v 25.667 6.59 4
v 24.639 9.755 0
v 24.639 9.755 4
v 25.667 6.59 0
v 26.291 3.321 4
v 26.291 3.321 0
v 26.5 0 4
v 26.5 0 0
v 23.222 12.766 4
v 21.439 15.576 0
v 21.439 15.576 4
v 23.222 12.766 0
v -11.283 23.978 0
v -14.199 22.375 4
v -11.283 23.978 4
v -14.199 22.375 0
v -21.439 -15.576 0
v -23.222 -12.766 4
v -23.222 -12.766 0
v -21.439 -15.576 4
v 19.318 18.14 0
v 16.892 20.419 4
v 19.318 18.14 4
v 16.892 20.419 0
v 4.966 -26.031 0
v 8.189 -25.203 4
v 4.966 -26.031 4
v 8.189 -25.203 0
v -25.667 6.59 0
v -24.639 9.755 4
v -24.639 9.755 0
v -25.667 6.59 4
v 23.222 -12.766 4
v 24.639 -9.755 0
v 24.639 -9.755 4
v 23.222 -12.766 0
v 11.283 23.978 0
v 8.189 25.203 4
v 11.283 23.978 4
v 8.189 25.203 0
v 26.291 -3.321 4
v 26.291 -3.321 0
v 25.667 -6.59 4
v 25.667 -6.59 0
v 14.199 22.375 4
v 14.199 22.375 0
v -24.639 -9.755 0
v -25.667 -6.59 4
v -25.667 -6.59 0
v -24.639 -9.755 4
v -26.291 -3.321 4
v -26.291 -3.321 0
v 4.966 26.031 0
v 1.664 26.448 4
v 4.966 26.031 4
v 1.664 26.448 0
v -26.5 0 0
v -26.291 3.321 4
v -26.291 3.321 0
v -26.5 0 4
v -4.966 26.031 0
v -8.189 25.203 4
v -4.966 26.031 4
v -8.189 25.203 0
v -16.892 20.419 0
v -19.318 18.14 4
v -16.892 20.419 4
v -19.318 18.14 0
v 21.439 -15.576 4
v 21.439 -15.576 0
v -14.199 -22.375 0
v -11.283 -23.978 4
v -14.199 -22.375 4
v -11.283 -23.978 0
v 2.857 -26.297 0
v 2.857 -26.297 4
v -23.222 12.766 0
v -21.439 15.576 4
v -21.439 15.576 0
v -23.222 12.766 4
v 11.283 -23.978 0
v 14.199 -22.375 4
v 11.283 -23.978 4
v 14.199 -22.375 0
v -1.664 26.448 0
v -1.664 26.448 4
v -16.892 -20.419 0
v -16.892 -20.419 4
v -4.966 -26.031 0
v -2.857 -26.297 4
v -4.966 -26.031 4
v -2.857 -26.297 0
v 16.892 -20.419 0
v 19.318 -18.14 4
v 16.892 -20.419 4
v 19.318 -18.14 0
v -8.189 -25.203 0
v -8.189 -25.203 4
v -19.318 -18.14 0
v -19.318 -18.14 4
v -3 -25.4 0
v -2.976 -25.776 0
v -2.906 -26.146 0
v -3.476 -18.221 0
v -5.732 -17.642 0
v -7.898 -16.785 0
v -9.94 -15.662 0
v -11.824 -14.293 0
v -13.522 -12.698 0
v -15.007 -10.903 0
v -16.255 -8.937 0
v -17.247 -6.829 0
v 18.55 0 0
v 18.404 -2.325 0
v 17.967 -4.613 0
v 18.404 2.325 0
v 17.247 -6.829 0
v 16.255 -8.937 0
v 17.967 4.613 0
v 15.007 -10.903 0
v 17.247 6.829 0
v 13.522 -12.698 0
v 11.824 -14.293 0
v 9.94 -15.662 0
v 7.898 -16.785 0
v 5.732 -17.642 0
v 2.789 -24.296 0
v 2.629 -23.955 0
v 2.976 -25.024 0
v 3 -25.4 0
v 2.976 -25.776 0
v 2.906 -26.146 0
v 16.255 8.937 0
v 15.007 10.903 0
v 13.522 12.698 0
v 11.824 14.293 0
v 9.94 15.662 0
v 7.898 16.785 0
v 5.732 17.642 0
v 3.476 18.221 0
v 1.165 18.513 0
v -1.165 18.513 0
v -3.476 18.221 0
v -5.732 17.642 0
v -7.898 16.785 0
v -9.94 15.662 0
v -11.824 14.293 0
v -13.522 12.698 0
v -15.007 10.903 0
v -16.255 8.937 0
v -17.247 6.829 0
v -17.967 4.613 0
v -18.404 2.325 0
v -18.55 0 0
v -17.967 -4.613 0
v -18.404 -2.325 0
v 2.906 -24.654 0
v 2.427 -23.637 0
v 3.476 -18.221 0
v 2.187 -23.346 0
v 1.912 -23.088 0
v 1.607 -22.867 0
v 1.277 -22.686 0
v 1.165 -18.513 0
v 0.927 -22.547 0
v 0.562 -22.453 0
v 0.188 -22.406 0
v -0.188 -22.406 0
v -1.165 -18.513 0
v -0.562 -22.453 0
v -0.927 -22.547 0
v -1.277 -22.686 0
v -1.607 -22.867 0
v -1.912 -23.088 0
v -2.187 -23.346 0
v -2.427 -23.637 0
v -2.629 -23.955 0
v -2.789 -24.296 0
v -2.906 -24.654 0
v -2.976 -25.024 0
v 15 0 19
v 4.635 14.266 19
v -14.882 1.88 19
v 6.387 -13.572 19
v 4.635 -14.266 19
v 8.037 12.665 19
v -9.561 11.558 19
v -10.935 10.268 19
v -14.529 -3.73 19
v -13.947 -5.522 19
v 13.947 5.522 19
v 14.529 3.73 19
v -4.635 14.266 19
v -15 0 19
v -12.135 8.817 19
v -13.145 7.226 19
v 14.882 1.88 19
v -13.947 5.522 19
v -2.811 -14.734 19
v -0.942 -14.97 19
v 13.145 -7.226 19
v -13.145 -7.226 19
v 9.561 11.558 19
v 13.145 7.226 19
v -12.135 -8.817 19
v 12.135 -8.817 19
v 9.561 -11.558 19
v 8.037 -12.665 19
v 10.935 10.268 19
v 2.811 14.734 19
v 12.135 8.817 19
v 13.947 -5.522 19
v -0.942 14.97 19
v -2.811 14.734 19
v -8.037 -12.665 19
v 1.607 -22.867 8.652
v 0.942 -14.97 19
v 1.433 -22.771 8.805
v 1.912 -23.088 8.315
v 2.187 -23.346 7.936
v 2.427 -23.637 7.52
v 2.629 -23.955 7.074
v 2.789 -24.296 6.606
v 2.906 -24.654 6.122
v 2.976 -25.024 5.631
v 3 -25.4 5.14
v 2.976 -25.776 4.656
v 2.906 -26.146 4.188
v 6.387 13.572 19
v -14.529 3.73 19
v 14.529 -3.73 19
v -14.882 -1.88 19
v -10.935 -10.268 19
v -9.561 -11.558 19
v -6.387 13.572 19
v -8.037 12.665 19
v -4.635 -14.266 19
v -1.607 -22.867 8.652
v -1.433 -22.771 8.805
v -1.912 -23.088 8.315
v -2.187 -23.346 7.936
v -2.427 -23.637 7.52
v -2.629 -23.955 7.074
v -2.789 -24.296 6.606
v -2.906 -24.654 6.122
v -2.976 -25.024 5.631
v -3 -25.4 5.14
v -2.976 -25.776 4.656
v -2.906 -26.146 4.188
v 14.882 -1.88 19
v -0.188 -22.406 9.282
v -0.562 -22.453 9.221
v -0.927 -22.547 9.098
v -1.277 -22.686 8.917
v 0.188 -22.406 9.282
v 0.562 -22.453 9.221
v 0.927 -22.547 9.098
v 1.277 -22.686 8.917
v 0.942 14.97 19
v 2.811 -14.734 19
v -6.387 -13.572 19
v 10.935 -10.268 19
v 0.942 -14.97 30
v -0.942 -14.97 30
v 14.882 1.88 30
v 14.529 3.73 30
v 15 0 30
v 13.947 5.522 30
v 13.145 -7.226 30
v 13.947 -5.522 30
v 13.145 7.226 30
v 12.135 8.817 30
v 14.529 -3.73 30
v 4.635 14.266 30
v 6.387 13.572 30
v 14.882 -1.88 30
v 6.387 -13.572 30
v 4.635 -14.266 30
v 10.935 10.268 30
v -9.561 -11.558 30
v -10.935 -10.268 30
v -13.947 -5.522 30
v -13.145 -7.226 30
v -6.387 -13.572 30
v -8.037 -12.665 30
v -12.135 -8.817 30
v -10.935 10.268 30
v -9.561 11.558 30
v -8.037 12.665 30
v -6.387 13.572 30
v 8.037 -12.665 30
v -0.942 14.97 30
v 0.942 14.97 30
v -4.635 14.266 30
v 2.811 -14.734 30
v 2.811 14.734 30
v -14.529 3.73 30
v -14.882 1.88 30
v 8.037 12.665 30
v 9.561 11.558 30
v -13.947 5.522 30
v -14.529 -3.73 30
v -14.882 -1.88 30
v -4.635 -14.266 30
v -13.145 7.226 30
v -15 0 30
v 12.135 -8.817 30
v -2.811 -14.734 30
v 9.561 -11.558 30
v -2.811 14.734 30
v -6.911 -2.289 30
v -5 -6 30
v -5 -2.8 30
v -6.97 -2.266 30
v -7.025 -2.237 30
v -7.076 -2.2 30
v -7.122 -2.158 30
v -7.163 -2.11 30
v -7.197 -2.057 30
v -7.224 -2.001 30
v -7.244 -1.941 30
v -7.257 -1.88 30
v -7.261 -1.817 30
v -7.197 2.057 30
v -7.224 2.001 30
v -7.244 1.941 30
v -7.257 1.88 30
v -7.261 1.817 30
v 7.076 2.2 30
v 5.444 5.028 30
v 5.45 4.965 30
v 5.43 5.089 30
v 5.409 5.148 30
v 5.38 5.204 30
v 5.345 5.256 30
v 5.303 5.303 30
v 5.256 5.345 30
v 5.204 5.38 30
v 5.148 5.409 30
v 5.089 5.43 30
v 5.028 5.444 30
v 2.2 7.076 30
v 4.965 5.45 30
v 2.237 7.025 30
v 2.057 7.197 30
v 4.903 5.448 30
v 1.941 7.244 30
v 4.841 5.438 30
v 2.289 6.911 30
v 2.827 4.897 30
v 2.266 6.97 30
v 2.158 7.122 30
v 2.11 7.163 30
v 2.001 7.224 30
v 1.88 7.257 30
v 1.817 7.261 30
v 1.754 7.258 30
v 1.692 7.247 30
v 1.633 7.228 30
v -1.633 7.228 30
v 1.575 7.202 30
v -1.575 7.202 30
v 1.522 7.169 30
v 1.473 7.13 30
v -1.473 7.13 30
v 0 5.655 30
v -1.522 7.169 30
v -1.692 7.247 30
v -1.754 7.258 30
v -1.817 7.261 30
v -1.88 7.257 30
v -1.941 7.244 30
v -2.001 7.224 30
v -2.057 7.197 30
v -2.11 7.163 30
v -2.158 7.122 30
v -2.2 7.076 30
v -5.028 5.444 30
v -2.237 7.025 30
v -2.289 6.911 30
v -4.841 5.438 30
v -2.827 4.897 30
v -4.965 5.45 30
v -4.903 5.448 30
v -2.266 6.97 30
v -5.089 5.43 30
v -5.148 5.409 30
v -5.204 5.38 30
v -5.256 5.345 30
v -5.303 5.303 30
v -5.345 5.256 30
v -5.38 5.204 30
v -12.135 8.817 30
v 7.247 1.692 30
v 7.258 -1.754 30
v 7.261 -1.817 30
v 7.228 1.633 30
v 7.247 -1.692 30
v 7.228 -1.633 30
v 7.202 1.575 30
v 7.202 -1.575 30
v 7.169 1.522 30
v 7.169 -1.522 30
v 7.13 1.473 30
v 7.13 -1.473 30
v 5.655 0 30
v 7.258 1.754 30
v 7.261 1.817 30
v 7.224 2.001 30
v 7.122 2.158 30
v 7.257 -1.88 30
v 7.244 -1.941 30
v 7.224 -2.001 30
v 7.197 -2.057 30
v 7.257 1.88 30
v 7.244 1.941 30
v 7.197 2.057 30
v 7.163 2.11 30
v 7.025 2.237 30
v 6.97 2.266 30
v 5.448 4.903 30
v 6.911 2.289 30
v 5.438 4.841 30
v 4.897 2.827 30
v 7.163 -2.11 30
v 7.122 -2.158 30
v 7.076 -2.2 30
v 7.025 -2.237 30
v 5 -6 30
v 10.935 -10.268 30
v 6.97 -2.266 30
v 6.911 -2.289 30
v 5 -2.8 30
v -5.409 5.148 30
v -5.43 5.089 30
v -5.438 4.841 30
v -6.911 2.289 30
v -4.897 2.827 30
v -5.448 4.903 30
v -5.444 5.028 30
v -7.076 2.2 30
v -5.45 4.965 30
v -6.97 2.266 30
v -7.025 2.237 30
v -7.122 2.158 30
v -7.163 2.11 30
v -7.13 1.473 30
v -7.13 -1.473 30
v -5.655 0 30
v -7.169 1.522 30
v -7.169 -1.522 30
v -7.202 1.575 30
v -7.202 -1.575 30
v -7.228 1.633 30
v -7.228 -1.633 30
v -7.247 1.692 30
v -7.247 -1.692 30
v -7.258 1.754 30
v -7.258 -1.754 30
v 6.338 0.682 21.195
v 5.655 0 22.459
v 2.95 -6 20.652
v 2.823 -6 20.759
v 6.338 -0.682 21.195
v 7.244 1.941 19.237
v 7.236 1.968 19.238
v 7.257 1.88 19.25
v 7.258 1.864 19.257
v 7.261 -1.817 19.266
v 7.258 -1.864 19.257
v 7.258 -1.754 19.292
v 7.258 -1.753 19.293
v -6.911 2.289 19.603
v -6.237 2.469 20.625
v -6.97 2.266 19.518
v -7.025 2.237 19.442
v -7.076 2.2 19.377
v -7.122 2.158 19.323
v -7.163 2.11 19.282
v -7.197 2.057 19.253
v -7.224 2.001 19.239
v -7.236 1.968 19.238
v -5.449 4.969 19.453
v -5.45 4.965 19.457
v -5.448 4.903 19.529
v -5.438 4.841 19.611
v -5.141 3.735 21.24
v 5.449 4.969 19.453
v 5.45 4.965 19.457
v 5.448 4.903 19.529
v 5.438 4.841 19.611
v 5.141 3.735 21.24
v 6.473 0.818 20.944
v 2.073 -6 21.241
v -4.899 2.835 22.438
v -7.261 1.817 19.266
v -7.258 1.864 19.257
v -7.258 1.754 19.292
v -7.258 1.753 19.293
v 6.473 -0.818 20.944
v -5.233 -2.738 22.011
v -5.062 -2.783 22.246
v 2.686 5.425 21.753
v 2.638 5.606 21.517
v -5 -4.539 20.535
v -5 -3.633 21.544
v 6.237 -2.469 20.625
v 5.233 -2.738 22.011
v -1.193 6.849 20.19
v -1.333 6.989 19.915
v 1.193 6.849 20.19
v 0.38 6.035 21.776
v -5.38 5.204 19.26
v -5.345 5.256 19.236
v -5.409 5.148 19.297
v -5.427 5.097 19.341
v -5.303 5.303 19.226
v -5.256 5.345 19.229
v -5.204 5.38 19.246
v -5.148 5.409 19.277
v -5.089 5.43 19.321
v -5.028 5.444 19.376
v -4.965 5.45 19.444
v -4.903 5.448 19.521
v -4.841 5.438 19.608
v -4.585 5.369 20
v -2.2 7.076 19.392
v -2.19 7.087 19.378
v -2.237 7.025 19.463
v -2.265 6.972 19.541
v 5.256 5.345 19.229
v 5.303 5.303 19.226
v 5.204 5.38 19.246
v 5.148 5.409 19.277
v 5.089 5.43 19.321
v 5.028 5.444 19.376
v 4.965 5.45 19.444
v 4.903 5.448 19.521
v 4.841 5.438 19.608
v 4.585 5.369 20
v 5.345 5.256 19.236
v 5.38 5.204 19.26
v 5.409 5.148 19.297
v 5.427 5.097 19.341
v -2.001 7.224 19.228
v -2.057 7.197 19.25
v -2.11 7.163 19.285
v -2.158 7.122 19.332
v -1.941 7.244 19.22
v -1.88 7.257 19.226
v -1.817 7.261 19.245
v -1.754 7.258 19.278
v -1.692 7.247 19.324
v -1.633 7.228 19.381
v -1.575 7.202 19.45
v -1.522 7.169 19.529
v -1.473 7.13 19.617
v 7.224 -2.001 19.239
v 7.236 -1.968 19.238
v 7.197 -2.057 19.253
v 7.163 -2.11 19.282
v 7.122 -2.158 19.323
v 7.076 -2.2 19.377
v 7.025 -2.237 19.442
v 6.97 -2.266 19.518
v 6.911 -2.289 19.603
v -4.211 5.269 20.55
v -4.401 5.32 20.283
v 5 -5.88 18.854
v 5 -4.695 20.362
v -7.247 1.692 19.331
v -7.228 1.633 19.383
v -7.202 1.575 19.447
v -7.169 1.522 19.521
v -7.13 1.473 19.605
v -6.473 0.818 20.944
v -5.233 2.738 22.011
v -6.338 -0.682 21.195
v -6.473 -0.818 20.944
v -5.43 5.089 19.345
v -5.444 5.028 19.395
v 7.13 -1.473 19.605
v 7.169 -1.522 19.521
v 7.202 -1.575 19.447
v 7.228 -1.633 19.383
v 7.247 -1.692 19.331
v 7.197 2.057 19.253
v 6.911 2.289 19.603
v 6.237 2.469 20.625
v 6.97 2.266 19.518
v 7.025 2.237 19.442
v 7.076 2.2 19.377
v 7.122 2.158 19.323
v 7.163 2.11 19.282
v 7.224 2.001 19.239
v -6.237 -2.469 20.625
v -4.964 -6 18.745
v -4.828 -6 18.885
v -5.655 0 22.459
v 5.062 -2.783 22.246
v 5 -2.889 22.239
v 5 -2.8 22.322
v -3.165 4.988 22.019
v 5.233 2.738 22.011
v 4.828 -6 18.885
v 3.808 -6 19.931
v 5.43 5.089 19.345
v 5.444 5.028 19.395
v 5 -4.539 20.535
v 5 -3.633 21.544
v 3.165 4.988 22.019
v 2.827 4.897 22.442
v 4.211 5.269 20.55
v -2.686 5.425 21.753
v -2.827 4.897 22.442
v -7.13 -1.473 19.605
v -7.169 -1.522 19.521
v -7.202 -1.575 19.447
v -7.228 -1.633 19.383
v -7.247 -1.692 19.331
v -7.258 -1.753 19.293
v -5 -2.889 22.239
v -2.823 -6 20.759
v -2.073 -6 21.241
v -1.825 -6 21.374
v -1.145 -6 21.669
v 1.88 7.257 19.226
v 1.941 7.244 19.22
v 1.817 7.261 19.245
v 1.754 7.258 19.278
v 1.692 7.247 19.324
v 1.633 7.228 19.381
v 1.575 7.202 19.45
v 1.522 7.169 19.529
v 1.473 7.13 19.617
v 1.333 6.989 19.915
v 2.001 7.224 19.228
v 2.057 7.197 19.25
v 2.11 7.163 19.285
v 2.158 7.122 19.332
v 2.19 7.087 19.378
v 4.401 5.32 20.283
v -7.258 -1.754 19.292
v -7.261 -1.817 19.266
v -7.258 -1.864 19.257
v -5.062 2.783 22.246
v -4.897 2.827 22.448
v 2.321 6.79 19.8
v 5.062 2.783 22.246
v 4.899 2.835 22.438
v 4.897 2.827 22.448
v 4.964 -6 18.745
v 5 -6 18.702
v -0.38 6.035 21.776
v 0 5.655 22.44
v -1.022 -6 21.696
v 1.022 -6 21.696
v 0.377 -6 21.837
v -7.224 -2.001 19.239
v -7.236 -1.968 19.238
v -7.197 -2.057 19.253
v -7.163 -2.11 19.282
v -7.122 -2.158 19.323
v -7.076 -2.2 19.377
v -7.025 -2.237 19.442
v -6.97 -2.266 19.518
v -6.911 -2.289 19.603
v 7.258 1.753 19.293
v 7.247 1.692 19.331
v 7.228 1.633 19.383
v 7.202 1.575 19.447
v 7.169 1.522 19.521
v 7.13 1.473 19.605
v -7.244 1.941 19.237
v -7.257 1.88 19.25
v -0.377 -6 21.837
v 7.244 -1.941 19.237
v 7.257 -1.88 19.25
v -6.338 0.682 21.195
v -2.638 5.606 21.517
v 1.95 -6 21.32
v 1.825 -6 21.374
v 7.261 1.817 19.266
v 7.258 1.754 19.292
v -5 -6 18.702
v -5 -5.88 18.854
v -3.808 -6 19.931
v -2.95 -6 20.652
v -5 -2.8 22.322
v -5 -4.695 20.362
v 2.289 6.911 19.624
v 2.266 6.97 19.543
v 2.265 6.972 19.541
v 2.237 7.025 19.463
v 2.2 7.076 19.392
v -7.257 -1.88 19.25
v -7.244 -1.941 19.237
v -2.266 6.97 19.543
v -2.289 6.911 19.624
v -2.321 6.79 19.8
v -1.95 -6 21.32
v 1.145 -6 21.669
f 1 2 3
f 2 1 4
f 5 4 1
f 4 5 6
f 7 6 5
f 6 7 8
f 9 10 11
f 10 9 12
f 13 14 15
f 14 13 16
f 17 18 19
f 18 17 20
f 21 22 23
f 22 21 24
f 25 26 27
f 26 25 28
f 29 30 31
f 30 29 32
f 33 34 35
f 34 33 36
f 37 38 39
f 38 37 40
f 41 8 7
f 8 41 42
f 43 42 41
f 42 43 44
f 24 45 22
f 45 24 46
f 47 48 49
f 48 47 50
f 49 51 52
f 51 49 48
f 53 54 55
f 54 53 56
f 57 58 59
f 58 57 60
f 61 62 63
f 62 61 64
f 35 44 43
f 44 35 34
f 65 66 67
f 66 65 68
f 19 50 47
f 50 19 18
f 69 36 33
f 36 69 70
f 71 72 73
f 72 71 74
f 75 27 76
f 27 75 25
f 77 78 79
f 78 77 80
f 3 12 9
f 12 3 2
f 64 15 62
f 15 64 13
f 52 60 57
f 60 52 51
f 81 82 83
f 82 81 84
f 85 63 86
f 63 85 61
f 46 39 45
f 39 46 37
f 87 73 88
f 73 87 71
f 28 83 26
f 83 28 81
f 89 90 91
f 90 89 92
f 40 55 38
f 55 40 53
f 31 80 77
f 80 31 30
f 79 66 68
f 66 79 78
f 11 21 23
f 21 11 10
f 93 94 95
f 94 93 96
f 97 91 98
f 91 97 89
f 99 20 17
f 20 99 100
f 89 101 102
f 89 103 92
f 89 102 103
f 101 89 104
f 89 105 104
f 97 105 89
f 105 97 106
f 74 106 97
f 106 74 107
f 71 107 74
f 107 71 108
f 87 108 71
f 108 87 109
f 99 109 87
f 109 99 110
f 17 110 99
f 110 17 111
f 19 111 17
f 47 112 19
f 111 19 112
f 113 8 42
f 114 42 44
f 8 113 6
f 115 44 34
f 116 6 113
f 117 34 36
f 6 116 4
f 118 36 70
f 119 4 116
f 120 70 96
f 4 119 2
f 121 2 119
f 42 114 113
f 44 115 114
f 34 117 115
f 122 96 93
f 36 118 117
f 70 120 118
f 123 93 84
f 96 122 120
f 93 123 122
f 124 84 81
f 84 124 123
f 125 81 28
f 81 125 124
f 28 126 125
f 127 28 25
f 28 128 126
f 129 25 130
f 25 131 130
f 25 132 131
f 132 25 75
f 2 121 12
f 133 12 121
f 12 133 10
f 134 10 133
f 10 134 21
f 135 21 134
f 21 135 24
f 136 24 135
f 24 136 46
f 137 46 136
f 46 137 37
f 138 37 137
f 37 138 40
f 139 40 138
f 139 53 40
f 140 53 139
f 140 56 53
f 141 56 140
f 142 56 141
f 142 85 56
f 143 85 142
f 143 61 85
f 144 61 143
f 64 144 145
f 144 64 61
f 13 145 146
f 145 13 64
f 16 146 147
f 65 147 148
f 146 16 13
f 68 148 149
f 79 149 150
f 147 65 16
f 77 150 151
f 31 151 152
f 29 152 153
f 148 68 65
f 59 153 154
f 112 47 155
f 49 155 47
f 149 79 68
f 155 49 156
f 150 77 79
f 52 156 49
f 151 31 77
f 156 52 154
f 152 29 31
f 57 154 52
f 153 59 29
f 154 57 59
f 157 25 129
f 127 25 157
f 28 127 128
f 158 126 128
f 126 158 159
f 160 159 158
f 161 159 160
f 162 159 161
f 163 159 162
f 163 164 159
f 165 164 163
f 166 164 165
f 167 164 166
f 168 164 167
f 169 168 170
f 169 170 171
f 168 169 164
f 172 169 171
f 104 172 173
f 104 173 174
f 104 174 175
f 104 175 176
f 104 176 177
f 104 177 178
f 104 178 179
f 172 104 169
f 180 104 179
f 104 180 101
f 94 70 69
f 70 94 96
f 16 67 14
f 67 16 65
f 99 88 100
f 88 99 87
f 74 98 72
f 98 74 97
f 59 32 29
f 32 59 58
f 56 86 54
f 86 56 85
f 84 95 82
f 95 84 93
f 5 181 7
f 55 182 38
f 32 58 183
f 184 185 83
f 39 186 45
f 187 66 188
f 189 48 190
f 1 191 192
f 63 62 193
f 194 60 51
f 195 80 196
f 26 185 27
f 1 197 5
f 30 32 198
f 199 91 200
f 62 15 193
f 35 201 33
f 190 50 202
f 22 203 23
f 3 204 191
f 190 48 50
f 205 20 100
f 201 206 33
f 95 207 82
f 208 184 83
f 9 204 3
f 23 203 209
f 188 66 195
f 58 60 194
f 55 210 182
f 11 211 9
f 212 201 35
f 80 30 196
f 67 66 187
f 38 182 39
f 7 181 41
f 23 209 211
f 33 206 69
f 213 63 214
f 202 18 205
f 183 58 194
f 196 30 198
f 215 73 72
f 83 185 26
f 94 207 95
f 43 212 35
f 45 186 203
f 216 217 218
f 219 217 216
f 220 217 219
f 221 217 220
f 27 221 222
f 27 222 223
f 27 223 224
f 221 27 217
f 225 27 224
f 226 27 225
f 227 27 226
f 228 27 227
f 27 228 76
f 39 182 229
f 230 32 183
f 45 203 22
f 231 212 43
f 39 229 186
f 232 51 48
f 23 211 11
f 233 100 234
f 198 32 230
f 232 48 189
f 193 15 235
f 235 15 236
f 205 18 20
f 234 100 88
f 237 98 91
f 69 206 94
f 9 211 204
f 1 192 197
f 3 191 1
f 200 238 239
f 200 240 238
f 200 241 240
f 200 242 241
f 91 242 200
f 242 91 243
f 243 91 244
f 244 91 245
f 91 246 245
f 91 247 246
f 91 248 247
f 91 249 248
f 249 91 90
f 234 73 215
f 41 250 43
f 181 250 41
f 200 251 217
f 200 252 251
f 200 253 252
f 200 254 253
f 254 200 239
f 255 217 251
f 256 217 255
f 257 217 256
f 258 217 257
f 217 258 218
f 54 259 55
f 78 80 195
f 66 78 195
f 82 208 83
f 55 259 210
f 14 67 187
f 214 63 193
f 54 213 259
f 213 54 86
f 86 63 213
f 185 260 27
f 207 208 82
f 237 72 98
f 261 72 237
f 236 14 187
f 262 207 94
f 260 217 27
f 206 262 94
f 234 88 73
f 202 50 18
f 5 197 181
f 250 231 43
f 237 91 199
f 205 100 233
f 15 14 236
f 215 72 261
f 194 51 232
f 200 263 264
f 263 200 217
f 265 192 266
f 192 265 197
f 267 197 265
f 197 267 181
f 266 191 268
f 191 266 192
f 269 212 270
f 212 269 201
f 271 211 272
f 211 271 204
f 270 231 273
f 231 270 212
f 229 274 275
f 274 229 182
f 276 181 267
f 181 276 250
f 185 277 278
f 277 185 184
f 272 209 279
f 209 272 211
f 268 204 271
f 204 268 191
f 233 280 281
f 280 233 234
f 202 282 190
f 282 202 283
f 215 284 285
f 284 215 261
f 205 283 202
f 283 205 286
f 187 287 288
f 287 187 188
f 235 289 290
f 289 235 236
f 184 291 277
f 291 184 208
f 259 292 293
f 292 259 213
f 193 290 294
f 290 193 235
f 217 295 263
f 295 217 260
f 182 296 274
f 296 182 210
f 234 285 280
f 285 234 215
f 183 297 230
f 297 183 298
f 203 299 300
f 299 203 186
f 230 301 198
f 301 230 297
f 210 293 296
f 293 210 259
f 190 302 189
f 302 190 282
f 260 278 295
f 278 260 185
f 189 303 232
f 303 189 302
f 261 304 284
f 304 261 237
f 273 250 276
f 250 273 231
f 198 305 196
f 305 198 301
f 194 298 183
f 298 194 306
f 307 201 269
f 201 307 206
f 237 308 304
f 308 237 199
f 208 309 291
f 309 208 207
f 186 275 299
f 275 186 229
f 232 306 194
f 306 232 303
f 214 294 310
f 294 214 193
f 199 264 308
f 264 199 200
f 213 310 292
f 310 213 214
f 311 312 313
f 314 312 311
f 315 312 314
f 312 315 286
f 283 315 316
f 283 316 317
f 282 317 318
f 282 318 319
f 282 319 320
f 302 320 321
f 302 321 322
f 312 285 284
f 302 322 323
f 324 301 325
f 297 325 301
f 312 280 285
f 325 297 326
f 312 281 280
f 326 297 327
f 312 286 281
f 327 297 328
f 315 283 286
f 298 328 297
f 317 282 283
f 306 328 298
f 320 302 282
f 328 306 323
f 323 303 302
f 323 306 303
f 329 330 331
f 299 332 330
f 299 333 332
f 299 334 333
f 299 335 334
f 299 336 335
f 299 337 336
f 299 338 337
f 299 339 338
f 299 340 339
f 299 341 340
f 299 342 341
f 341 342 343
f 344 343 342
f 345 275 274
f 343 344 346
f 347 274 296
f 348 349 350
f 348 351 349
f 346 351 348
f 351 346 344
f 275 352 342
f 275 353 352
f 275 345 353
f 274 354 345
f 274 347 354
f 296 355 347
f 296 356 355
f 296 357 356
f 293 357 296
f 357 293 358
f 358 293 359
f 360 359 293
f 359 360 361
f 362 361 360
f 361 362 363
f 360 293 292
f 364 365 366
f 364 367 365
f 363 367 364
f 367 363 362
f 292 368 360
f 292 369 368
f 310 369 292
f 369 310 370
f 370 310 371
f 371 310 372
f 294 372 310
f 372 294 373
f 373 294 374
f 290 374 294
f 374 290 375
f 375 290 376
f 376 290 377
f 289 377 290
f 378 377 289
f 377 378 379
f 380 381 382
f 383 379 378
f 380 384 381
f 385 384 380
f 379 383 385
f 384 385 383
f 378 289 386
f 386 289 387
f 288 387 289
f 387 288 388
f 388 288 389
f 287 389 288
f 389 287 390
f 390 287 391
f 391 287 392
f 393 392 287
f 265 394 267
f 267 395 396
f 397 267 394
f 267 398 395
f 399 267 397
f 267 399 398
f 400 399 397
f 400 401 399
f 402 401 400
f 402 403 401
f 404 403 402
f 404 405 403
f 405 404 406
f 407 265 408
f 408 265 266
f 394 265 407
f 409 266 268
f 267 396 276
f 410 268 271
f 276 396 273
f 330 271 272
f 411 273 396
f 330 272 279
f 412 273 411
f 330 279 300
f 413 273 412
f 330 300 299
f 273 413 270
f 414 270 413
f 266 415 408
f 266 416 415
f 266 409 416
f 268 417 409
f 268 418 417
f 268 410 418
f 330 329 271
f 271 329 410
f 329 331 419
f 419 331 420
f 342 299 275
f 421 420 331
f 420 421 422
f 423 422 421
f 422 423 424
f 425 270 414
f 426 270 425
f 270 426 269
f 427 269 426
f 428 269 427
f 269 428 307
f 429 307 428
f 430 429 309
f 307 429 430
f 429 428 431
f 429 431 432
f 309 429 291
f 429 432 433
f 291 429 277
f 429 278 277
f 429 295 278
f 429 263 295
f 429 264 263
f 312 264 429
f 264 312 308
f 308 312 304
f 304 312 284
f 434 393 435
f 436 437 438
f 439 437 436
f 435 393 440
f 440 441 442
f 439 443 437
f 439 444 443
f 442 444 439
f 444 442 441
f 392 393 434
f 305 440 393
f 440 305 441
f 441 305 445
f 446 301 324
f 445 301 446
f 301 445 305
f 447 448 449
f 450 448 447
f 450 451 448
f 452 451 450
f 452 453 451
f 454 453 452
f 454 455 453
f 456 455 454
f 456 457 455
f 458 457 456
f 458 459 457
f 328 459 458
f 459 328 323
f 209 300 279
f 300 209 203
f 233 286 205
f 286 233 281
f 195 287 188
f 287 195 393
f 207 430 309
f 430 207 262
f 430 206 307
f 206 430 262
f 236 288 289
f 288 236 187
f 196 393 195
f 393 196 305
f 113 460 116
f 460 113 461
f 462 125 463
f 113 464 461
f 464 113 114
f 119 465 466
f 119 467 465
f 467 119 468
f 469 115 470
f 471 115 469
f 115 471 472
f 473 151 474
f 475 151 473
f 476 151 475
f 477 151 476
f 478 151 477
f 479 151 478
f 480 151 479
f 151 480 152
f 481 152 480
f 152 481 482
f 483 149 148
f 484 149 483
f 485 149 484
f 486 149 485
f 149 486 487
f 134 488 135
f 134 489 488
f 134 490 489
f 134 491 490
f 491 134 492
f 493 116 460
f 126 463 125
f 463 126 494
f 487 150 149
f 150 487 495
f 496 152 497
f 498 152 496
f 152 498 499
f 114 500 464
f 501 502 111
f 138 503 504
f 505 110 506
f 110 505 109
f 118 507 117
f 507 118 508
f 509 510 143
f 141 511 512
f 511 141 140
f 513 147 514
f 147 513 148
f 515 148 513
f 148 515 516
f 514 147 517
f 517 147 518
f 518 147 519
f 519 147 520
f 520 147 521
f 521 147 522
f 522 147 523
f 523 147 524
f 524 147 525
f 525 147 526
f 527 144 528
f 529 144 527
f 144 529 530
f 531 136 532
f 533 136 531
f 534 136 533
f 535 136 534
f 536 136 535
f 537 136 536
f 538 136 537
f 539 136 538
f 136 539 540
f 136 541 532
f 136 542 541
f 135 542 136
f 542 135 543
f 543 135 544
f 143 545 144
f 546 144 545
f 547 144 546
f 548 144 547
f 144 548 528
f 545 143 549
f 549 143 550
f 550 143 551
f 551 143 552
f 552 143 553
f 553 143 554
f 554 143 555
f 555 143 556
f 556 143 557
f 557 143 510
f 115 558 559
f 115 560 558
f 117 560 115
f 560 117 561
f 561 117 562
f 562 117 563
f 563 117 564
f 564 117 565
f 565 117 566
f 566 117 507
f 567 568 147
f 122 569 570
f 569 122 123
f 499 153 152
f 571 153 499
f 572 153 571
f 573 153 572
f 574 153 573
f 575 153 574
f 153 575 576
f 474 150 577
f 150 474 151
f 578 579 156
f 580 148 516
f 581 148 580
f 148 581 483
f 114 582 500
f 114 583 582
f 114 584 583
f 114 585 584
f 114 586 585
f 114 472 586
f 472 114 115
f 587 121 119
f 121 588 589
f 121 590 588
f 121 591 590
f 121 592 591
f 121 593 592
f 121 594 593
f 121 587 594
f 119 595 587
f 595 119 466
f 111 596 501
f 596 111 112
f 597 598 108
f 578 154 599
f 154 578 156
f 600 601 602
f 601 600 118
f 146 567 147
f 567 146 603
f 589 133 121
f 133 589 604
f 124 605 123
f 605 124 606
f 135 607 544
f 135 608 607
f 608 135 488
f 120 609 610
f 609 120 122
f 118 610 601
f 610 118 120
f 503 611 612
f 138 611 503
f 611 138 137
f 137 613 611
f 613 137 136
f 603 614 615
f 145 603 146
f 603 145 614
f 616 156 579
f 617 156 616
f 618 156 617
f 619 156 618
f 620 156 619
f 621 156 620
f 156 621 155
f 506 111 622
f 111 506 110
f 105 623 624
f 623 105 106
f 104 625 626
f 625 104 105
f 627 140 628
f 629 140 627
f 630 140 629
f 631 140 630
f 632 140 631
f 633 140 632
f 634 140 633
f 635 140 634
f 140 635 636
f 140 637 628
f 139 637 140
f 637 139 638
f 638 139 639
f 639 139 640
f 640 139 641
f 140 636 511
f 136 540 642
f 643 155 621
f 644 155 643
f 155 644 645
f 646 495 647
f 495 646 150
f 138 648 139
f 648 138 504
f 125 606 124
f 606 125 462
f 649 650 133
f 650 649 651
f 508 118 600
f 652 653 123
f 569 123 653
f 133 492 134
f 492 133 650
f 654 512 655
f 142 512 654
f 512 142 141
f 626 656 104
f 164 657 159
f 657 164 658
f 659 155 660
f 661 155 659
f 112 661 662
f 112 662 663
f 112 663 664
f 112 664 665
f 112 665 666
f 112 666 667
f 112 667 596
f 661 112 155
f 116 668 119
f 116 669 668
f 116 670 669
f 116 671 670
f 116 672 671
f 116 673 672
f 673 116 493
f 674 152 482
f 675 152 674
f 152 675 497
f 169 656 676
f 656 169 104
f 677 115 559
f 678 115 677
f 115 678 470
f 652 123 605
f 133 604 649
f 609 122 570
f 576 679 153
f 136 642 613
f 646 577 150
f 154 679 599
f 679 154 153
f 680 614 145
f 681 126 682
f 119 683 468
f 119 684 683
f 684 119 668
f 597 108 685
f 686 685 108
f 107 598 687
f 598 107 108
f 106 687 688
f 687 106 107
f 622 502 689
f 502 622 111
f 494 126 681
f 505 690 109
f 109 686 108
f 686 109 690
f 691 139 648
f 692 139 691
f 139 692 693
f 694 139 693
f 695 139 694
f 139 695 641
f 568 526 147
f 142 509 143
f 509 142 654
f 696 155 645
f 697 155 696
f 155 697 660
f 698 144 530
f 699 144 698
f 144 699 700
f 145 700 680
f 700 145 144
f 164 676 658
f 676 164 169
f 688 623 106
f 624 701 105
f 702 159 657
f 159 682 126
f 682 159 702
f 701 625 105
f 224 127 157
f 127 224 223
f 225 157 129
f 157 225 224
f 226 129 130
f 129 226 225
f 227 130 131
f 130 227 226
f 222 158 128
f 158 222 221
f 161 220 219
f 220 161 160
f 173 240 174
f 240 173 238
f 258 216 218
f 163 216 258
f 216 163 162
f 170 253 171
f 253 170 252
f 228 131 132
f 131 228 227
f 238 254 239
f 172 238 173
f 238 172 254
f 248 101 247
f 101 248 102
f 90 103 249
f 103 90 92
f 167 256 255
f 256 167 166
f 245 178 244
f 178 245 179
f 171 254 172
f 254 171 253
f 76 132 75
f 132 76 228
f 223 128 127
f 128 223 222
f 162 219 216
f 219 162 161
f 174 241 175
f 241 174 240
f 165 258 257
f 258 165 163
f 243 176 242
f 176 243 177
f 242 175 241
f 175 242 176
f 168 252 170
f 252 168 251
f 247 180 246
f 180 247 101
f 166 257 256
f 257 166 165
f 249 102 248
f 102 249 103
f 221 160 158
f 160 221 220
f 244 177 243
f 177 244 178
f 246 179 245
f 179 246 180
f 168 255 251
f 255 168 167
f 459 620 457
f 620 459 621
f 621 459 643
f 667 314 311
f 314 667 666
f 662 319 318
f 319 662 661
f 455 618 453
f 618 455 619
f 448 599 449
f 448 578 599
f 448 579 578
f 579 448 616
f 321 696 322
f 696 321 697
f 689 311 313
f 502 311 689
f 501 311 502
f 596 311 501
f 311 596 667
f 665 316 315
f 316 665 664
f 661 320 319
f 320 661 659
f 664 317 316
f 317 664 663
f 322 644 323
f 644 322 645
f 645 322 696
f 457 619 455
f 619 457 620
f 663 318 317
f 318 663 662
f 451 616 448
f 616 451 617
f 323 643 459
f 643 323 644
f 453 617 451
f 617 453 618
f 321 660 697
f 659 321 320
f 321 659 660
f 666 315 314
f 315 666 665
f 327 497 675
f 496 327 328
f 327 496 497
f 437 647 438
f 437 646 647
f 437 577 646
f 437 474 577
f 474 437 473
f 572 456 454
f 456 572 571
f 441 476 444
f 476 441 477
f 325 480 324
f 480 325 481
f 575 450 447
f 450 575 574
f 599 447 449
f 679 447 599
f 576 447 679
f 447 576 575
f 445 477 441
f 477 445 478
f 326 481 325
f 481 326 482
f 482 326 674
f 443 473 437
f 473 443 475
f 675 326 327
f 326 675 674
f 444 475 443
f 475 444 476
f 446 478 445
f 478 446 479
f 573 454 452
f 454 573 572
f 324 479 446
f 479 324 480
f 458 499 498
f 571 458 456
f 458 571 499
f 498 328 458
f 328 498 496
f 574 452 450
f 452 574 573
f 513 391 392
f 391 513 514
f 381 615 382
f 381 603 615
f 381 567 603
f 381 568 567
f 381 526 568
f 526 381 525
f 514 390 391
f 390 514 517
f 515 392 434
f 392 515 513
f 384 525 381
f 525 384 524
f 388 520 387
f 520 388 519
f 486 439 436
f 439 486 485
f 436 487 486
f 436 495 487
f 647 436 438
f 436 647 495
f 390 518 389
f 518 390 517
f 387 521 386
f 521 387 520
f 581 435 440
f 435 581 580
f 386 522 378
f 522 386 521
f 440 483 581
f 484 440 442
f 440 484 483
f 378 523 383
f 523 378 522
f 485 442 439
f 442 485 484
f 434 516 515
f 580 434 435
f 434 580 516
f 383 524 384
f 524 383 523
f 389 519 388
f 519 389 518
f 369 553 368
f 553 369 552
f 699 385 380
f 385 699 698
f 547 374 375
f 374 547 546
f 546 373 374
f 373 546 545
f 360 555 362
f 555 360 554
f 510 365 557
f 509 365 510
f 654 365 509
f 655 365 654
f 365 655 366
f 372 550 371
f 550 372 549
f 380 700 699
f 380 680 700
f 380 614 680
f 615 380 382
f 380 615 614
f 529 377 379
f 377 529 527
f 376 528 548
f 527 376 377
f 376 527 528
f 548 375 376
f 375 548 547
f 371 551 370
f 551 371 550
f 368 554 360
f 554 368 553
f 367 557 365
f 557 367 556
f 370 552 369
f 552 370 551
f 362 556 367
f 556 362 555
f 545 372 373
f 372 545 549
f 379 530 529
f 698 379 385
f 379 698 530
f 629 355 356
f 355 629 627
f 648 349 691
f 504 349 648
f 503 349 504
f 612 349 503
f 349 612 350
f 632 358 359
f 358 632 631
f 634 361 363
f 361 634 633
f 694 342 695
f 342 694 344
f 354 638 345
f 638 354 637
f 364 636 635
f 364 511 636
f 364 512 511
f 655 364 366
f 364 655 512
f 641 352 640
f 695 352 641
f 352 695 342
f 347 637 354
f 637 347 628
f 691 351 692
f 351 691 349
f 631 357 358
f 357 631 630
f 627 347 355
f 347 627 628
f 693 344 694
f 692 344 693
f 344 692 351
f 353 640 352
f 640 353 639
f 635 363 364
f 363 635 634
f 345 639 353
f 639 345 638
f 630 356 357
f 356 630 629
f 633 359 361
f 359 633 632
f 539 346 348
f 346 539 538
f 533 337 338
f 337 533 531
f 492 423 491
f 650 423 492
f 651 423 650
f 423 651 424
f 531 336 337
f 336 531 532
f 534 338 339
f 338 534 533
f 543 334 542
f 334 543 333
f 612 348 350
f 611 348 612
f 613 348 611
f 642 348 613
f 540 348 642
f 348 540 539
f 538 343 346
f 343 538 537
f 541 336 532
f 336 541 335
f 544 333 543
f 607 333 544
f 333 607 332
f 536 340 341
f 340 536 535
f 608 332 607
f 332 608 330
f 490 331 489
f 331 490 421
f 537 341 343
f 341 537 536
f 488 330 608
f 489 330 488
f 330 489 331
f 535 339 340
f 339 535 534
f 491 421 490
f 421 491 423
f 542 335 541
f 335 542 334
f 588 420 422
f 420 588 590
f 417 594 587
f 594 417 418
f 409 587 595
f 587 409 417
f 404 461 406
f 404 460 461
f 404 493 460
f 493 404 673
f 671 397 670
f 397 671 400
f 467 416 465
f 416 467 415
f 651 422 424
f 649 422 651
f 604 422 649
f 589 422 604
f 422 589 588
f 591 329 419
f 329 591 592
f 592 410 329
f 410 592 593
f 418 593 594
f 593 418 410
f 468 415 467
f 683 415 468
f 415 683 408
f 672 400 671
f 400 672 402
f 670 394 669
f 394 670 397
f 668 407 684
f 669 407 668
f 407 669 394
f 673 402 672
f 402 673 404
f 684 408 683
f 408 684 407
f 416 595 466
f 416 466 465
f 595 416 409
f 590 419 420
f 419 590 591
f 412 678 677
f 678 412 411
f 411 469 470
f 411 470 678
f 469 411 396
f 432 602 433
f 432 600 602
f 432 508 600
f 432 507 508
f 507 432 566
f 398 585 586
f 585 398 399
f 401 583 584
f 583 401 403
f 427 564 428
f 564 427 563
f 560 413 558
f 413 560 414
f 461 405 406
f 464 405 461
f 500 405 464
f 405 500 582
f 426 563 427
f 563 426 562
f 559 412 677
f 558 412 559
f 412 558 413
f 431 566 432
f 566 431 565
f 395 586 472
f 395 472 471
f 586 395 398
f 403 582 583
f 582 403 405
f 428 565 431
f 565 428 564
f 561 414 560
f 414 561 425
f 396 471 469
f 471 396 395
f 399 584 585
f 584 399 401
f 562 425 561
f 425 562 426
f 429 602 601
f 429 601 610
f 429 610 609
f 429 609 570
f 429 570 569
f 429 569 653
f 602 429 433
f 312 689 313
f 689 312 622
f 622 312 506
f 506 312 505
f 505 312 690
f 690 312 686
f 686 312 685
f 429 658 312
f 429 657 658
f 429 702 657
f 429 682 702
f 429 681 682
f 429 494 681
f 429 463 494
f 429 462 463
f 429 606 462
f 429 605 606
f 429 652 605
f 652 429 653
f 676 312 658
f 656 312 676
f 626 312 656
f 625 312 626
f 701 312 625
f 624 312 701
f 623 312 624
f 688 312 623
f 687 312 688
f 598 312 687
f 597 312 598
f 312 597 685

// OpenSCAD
$fn=50;


prumer_1 = 53; // prumer lisovaciho nadstavce
prumer_2 = 30; // prumer lisovaciho nadstavce
vyska = 30; // vzska lisovaciho nadstavce


module plato()
{
    difference()
    {
        union()
        {
            translate([0,0,0]) cylinder(d=prumer_1, h=4);
            translate([0,0,4]) cylinder(d1=prumer_1,d2=prumer_2, h=15);
            translate([0,0,0]) cylinder(d=prumer_2, h=vyska);
        }
        union()
        {
            translate([0,0,0]) cylinder(d1=prumer_1*0.7, d=prumer_1*0.05, h=vyska);
            translate([0,-((prumer_1/2)-1.1),0]) cylinder(d=6, h=vyska);
        }
    }
}

module tvar_2()
{
    translate([-5,-6,0]) cube([10,5,vyska]);
    for(i=[-15:30:210])
    {
        rotate([0,0,-i])
        {
            hull()
            {
                translate([0,0,0]) cylinder(d=8, h=vyska);
                translate([-7,0,0]) cylinder(d=1, h=vyska);
            }
        }
    }
}

difference()
{
    plato();
    translate([0,0,0]) tvar_2();
}
